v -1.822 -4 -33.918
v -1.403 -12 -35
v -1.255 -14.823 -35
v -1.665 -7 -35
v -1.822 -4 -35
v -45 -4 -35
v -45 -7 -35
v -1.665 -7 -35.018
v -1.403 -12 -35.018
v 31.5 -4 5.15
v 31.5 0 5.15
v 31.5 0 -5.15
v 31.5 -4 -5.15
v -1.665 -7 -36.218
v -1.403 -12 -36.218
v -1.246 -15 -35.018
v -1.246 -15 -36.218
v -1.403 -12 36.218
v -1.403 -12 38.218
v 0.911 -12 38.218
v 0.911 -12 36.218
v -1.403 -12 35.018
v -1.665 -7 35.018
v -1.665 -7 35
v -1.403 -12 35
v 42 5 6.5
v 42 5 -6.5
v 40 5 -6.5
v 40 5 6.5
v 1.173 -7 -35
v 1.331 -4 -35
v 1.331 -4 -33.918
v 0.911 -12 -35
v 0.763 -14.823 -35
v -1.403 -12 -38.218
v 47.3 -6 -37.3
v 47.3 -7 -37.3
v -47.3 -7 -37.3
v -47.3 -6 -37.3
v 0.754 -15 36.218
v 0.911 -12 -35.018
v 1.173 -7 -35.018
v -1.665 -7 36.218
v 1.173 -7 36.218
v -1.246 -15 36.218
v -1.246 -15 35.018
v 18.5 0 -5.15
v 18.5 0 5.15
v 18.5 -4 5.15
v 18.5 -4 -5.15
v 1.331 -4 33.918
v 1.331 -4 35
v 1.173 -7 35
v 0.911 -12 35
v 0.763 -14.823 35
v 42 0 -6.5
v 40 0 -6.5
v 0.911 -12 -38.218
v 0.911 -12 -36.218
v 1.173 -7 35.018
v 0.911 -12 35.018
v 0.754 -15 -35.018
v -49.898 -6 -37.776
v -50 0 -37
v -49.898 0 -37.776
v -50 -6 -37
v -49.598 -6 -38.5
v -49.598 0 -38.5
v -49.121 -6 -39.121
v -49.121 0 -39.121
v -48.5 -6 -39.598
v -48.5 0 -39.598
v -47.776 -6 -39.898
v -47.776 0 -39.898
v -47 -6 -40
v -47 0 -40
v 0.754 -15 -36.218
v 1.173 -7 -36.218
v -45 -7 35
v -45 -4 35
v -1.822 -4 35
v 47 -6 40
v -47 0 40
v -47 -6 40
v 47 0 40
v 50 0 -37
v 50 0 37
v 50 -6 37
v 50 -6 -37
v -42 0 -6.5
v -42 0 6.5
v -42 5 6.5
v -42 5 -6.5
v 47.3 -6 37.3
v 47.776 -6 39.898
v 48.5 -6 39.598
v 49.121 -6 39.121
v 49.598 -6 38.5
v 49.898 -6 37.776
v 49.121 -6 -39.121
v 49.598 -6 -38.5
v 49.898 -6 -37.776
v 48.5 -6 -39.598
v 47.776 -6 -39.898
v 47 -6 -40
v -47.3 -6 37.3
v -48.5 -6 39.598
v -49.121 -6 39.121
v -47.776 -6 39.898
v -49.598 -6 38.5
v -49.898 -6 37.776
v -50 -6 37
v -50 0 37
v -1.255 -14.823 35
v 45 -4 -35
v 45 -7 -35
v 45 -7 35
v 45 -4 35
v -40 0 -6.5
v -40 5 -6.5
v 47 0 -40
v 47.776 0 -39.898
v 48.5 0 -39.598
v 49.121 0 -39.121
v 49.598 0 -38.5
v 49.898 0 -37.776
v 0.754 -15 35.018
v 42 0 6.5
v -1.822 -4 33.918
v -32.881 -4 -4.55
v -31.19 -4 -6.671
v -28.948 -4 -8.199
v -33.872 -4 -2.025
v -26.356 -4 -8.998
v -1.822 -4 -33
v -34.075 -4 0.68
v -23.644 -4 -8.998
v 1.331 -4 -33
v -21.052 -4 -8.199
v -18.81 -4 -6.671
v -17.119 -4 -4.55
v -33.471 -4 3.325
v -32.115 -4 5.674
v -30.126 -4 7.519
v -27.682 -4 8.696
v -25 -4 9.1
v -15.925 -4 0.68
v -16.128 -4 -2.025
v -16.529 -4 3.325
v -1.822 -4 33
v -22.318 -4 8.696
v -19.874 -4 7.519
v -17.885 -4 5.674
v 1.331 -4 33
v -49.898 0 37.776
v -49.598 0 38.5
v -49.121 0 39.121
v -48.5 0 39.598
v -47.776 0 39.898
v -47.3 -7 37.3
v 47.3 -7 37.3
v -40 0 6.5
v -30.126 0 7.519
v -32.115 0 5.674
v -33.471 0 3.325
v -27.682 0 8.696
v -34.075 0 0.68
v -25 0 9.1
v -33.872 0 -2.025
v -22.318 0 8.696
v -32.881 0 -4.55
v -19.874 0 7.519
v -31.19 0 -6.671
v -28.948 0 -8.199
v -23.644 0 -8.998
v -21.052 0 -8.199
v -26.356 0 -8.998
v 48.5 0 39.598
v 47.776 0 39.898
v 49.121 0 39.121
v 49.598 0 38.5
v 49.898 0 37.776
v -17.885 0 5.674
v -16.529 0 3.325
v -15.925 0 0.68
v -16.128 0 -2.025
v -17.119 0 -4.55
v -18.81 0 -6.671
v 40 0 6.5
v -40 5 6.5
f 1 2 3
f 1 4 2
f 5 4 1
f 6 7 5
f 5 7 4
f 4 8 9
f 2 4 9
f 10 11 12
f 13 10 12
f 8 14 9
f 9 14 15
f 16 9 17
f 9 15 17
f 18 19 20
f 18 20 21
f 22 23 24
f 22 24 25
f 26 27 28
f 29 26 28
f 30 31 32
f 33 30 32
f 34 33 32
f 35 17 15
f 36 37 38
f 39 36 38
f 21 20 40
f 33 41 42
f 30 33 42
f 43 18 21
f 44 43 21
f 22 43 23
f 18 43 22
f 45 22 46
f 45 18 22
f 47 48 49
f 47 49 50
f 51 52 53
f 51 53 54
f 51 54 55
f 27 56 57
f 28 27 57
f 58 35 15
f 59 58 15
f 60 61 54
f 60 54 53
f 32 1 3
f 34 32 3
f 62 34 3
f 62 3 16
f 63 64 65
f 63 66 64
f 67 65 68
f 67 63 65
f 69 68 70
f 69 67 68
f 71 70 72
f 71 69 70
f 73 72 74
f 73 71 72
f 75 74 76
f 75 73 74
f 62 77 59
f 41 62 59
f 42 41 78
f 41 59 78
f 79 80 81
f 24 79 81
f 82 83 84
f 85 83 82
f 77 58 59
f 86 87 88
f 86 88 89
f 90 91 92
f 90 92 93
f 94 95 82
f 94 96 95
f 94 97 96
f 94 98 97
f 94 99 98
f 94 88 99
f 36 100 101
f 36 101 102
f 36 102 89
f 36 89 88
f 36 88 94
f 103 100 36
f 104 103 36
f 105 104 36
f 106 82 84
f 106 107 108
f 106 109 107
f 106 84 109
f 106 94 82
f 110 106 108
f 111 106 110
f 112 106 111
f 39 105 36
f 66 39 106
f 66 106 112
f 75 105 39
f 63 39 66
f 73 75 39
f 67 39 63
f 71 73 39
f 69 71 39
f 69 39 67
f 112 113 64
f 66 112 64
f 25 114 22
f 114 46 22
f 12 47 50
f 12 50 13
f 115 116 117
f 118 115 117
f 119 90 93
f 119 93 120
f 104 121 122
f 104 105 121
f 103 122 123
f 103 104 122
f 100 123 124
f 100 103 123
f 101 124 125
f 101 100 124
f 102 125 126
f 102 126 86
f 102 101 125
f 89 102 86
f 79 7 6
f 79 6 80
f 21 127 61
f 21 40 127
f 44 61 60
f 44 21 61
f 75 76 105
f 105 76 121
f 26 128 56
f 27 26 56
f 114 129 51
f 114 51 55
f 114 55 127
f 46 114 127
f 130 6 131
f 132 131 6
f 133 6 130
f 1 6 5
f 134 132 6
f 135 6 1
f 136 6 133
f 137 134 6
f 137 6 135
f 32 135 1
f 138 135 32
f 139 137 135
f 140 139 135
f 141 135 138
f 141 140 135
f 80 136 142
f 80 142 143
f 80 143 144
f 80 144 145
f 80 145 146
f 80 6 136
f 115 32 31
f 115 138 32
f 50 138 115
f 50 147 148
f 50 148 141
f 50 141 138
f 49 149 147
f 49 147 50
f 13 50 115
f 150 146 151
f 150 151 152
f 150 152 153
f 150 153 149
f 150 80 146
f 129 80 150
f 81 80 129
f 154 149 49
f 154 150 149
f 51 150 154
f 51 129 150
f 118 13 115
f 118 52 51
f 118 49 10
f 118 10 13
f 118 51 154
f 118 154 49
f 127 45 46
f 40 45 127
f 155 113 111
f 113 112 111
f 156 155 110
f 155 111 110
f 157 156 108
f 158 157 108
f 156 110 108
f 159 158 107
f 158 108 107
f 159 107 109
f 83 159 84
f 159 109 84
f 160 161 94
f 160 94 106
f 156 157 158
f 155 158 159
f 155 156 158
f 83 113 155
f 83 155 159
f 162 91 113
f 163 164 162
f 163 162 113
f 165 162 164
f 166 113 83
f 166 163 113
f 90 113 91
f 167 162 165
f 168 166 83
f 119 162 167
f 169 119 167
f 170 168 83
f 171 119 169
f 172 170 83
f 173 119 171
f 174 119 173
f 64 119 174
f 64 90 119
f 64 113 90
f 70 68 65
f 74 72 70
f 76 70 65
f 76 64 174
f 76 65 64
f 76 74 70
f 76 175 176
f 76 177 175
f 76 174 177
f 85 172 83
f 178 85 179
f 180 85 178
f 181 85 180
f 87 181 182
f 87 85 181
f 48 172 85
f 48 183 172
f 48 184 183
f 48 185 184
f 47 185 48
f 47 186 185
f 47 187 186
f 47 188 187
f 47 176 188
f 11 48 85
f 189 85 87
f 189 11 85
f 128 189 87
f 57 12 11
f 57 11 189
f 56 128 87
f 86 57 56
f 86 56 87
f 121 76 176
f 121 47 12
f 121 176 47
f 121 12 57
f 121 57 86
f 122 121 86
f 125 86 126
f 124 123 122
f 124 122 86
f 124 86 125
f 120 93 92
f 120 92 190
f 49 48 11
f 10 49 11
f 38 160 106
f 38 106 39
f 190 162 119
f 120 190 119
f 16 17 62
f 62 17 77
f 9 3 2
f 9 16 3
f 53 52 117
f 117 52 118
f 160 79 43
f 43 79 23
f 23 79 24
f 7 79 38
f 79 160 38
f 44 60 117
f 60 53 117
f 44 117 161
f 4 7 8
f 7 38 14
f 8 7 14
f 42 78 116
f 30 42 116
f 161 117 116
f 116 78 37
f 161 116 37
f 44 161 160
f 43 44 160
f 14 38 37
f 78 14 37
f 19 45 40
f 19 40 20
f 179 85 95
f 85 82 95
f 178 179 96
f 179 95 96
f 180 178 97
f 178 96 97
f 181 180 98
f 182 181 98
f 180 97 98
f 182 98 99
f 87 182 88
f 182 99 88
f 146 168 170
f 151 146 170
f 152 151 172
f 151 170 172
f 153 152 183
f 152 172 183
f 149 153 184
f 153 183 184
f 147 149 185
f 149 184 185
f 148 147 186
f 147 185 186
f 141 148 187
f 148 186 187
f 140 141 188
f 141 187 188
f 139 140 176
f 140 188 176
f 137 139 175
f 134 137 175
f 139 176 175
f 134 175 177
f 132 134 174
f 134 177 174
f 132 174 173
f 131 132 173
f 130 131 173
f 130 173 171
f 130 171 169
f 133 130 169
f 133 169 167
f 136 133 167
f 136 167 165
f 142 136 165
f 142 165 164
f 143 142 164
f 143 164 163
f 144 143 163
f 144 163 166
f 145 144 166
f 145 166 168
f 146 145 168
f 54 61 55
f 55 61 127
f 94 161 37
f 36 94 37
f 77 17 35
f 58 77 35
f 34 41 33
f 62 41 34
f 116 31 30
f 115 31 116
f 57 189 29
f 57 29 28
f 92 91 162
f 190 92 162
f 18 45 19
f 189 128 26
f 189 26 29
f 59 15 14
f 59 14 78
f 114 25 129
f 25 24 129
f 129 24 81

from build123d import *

# Parameters (mm, degrees)
SKETCH1_W           = 100
SKETCH1_H           = 80
BOSS_EXTRUDE1_DEPTH = 7
SKETCH2_W           = 90
SKETCH2_H           = 70
CUT_EXTRUDE1_DEPTH  = 3
SKETCH3_OUTSIDE_W   = 127.65
SKETCH3_OUTSIDE_H   = 107.65
SKETCH3_OUTSIDE_W_2 = 94.6
SKETCH3_OUTSIDE_H_2 = 74.6
CUT_EXTRUDE2_DEPTH  = 1
SKETCH4_W           = 2
SKETCH4_H           = 13
BOSS_EXTRUDE2_DEPTH = 5
SKETCH5_W           = 13
SKETCH5_H           = 10.3
CUT_EXTRUDE3_DEPTH  = 65.412731661
SKETCH6_R           = 9.1
CUT_EXTRUDE4_DEPTH  = 65.412731661
FILLET1_R           = 3
SNAP_START          = -36.217722162
SNAP_HOOK2_DEPTH    = 1.2
SNAP_START_2        = -36.063805806
SNAP_HOOK2_2_DEPTH  = 1.063805806
SNAP_START_3        = -1.403030484
SNAP_HOOK2_3_DEPTH  = 2.314446676
SNAP_START_4        = -1.822292718
SNAP_HOOK2_4_DEPTH  = 3.152971144
SNAP_START_5        = -35
SNAP_HOOK2_5_DEPTH  = 2
SNAP_START_6        = -39
SNAP_HOOK2_6_DEPTH  = 4


with BuildPart() as part:
    # Sketch1 → Boss-Extrude1 (new body)
    with BuildSketch(Plane(origin=(0, 0, 0), x_dir=(1, 0, 0), z_dir=(0, 1, 0))):
        Rectangle(SKETCH1_W, SKETCH1_H)
    extrude(amount=-BOSS_EXTRUDE1_DEPTH)

    # Sketch2 → Cut-Extrude1 (cut)
    with BuildSketch(Plane.XZ.offset(7)):
        Rectangle(SKETCH2_W, SKETCH2_H)
    extrude(amount=-CUT_EXTRUDE1_DEPTH, mode=Mode.SUBTRACT)

    # Sketch3 outside → Cut-Extrude2 (cut)
    with BuildSketch(Plane(origin=(0, -7, 0), x_dir=(-1, 0, 0), z_dir=(0, -1, 0))):
        Rectangle(SKETCH3_OUTSIDE_W, SKETCH3_OUTSIDE_H)
        Rectangle(SKETCH3_OUTSIDE_W_2, SKETCH3_OUTSIDE_H_2, mode=Mode.SUBTRACT)
    extrude(amount=-CUT_EXTRUDE2_DEPTH, mode=Mode.SUBTRACT)

    # Sketch4 → Boss-Extrude2 (add)
    with BuildSketch(Plane(origin=(0, 0, 0), x_dir=(1, 0, 0), z_dir=(0, 1, 0))):
        with Locations((-41, 0)):
            Rectangle(SKETCH4_W, SKETCH4_H)
    boss_extrude2 = extrude(amount=BOSS_EXTRUDE2_DEPTH)

    # Mirror2: Boss-Extrude2 across plane
    add(boss_extrude2.mirror(Plane(origin=(0, 0, 0), x_dir=(0, 0, 1), z_dir=(1, 0, 0))))

    # Sketch5 → Cut-Extrude3 (cut, through all)
    with BuildSketch(Plane(origin=(0, 0, 0), x_dir=(1, 0, 0), z_dir=(0, 1, 0))):
        with Locations((25, 0)):
            Rectangle(SKETCH5_W, SKETCH5_H)
    extrude(amount=-CUT_EXTRUDE3_DEPTH, mode=Mode.SUBTRACT)

    # Sketch6 → Cut-Extrude4 (cut, through all)
    with BuildSketch(Plane(origin=(0, 0, 0), x_dir=(1, 0, 0), z_dir=(0, 1, 0))):
        with Locations(Location((-25, 0, 0), (0, 0, 270))):
            Circle(SKETCH6_R)
    extrude(amount=-CUT_EXTRUDE4_DEPTH, mode=Mode.SUBTRACT)

    # Fillet1
    fillet1_edges = [part.edges().sort_by_distance(p)[0] for p in [
        (50, -3, -40),
        (-50, -3, -40),
        (-50, -3, 40),
        (50, -3, 40),
    ]]
    fillet(fillet1_edges, radius=FILLET1_R)

    # Snap Hook2: read off the stored shape, not the designer's step
    # Snap Hook2 outline → Snap Hook2 (add)
    with BuildSketch(Plane.XY.offset(SNAP_START)):
        Polygon((-1.245807146, -15), (0.754192854, -15), (1.173455088, -7), (-1.66506938, -7), align=None)
    snap_hook2 = extrude(amount=SNAP_HOOK2_DEPTH)

    # Snap Hook2 2 outline → Snap Hook2 2 (add)
    with BuildSketch(Plane.XY.offset(SNAP_START_2)):
        Polygon((-1.66506938, -7), (-1.403030484, -12), (0.911416192, -12), (1.173455088, -7), align=None)
    snap_hook2_2 = extrude(amount=SNAP_HOOK2_2_DEPTH)

    # Snap Hook2 3 outline → Snap Hook2 3 (add)
    with BuildSketch(Plane.YZ.offset(SNAP_START_3)):
        Polygon((-12, -36.217722162), (-15, -36.217722162), (-12, -38.217722162), align=None)
        Polygon((-4, -35), (-4, -33.917722162), (-15, -35.017722162), (-12, -35.017722162), (-12, -35), align=None)
    snap_hook2_3 = extrude(amount=SNAP_HOOK2_3_DEPTH)

    # Snap Hook2 4 outline → Snap Hook2 4 (add)
    with BuildSketch(Plane.YZ.offset(SNAP_START_4)):
        Polygon((-4, -35), (-4, -33.917722162), (-15, -35.017722162), (-12, -35.017722162), (-12, -35), align=None)
    snap_hook2_4 = extrude(amount=SNAP_HOOK2_4_DEPTH)

    # Snap Hook2 5 outline → Snap Hook2 5 (cut)
    with BuildSketch(Plane.XY.offset(SNAP_START_5)):
        Polygon((-1.822292718, -4), (-1.822292718, -16), (-1.193399367, -16), (-1.245807146, -15), align=None)
        Polygon((0.754192854, -15), (0.701785075, -16), (1.330678426, -16), (1.330678426, -4), align=None)
    snap_hook2_5 = extrude(amount=SNAP_HOOK2_5_DEPTH, mode=Mode.SUBTRACT)

    # Snap Hook2 6 outline → Snap Hook2 6 (cut)
    with BuildSketch(Plane.XY.offset(SNAP_START_6)):
        Polygon((-1.822292718, -16), (-1.193399367, -16), (-1.245807146, -15), (-1.403030484, -12), (-1.822292718, -12), align=None)
        Polygon((0.754192854, -15), (0.701785075, -16), (1.330678426, -16), (1.330678426, -12), (0.911416192, -12), align=None)
    snap_hook2_6 = extrude(amount=SNAP_HOOK2_6_DEPTH, mode=Mode.SUBTRACT)

    # Mirror4: Snap Hook2, Snap Hook2 2, Snap Hook2 3, Snap Hook2 4, Snap Hook2 5, Snap Hook2 6 across plane
    add(snap_hook2.mirror(Plane.XY))
    add(snap_hook2_2.mirror(Plane.XY))
    add(snap_hook2_3.mirror(Plane.XY))
    add(snap_hook2_4.mirror(Plane.XY))
    add(snap_hook2_5.mirror(Plane.XY), mode=Mode.SUBTRACT)
    add(snap_hook2_6.mirror(Plane.XY), mode=Mode.SUBTRACT)


solid = part.part
